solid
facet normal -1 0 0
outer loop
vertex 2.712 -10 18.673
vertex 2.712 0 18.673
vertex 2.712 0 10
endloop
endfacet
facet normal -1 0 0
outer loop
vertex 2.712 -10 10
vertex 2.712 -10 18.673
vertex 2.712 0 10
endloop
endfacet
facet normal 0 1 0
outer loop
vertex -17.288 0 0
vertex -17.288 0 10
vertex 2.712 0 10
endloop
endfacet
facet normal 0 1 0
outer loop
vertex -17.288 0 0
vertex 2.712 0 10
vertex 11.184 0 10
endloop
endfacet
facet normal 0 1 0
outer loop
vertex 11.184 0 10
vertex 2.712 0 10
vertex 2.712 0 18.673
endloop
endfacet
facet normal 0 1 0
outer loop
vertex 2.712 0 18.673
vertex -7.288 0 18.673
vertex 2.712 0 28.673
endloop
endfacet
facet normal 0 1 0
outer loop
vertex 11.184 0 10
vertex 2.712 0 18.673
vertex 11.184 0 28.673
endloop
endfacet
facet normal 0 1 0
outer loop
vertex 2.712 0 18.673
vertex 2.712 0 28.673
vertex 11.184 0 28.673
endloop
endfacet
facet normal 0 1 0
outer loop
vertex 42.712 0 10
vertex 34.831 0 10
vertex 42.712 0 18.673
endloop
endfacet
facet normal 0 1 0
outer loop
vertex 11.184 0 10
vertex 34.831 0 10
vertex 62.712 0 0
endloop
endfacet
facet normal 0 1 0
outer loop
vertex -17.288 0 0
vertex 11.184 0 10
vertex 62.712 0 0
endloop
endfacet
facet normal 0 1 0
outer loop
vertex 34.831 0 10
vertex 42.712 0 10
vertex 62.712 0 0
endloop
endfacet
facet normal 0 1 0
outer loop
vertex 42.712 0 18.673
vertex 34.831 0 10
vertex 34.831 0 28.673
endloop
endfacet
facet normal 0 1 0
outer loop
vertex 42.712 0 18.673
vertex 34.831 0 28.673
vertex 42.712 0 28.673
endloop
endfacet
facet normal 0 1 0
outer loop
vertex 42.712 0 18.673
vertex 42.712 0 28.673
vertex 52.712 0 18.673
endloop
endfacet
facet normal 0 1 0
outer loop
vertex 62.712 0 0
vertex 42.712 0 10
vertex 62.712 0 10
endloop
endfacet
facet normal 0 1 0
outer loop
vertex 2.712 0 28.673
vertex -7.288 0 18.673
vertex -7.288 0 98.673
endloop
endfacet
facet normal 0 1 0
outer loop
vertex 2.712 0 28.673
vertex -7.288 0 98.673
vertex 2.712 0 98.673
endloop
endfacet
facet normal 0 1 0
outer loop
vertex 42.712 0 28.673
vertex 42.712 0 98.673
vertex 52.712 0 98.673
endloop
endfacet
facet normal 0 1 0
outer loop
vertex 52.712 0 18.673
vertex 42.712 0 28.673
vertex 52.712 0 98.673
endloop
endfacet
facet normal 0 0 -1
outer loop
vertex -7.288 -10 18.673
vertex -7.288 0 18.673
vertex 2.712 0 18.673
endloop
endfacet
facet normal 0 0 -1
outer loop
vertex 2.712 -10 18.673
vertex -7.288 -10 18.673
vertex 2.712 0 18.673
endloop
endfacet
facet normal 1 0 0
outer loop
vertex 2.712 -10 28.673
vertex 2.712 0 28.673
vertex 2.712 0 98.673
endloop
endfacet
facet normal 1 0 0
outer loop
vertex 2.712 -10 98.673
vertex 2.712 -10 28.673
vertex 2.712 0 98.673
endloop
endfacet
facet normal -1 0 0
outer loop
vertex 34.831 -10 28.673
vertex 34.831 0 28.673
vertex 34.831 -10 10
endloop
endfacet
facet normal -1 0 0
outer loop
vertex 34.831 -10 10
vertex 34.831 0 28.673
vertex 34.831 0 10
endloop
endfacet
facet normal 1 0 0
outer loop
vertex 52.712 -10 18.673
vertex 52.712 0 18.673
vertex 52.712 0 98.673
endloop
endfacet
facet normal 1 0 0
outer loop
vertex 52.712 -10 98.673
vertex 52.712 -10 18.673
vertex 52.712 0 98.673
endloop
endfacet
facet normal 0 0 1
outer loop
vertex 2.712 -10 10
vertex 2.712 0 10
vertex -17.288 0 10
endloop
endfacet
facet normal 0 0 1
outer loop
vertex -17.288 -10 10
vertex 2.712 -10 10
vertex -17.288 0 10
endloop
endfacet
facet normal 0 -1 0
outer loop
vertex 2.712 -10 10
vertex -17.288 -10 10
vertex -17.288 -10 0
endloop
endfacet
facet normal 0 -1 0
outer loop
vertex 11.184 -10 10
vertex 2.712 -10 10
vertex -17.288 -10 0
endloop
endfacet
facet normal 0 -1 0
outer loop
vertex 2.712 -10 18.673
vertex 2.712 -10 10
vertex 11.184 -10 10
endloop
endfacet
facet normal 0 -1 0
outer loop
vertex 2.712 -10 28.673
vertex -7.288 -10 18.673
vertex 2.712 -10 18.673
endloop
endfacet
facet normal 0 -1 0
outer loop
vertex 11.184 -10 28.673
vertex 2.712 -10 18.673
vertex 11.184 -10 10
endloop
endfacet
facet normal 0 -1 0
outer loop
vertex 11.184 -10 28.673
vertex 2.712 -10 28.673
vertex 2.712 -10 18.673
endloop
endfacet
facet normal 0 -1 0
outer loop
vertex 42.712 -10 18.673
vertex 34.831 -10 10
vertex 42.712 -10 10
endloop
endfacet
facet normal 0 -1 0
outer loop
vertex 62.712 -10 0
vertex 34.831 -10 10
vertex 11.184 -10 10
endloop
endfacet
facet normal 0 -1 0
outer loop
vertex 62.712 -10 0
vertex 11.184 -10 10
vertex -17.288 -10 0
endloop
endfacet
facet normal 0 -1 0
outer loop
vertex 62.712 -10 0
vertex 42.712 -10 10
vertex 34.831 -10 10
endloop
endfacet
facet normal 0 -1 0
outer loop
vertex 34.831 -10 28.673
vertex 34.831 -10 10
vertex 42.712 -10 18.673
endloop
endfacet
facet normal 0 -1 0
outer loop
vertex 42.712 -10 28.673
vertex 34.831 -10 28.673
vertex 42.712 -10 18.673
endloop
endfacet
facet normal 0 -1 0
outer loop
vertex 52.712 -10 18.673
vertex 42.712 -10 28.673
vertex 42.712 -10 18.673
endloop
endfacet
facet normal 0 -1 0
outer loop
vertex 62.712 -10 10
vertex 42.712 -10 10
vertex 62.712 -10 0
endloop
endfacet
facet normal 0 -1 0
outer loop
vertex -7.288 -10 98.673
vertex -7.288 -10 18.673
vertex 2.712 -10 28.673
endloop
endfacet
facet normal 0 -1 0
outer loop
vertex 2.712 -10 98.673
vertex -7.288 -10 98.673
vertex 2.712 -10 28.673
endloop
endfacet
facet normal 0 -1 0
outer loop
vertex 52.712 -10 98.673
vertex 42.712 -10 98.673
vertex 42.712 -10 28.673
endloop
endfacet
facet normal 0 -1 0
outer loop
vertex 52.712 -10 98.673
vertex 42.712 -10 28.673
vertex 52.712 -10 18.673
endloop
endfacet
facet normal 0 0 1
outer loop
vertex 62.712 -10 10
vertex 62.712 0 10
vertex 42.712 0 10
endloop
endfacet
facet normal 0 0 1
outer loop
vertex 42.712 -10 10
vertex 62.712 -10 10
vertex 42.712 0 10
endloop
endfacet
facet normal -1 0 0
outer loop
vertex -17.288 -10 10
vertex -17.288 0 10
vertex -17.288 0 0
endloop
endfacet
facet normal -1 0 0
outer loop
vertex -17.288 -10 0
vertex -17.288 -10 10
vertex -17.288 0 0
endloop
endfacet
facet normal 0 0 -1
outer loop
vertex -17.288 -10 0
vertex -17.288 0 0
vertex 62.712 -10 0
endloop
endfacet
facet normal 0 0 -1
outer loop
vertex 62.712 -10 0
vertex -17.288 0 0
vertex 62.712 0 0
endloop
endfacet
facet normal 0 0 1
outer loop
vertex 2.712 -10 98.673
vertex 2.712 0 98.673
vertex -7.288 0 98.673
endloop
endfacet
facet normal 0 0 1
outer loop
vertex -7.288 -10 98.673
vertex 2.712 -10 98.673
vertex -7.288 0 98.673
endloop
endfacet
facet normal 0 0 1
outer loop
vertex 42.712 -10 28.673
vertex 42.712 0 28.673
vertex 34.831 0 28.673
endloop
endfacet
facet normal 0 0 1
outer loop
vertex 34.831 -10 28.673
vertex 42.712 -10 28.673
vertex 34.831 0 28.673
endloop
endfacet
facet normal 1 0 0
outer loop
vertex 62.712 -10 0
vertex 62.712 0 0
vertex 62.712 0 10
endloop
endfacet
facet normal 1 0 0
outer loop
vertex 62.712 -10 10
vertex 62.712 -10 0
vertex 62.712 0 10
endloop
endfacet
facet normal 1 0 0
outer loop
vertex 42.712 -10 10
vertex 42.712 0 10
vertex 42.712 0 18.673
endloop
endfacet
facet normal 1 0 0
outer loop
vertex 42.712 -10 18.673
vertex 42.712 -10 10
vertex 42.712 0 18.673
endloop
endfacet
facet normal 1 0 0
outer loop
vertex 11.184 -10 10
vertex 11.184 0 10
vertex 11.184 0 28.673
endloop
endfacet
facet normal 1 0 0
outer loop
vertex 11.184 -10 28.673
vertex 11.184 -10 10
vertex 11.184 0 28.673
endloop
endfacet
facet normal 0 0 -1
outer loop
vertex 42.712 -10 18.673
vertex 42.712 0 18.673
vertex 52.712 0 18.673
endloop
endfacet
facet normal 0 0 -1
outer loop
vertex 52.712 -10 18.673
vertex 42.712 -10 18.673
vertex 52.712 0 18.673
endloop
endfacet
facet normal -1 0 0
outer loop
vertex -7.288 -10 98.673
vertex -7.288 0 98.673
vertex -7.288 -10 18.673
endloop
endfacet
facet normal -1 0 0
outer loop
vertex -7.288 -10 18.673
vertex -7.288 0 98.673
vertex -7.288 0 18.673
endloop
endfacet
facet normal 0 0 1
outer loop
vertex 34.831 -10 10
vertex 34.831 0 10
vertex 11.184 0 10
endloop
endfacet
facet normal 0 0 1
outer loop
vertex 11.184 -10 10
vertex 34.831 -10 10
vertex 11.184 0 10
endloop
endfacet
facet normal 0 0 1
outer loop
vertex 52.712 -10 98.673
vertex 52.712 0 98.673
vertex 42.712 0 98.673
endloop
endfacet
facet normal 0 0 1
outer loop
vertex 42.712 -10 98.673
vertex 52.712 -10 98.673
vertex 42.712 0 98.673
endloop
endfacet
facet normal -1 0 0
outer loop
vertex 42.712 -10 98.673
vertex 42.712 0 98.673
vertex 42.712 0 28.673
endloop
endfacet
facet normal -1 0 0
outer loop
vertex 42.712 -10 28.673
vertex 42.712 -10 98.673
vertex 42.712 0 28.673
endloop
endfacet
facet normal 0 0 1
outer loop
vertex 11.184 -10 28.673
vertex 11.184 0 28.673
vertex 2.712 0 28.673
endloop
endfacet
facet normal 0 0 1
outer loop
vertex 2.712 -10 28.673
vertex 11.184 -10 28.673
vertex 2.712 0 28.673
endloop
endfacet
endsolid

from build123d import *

# Parameters (mm, degrees)
F1_DEPTH = 10


with BuildPart() as f1:
    # F0 (on Front) → F1 (new body)
    with BuildSketch(Plane.XZ):
        Polygon((-17.288136, 10), (-17.288136, 0), (62.711864, 0), (62.711864, 10), (42.711864, 10), (34.830804, 10), (11.184005, 10), (2.711864, 10), align=None)
        Polygon((2.711864, 18.67337), (2.711864, 10), (11.184005, 10), (11.184005, 28.67337), (2.711864, 28.67337), align=None)
        Polygon((34.830804, 10), (42.711864, 10), (42.711864, 18.67337), (42.711864, 28.67337), (34.830804, 28.67337), align=None)
        Polygon((-7.288136, 18.67337), (2.711864, 18.67337), (2.711864, 28.67337), (2.711864, 98.67337), (-7.288136, 98.67337), align=None)
        Polygon((42.711864, 28.67337), (42.711864, 18.67337), (52.711864, 18.67337), (52.711864, 98.67337), (42.711864, 98.67337), align=None)
    extrude(amount=F1_DEPTH)


solid = f1.part
